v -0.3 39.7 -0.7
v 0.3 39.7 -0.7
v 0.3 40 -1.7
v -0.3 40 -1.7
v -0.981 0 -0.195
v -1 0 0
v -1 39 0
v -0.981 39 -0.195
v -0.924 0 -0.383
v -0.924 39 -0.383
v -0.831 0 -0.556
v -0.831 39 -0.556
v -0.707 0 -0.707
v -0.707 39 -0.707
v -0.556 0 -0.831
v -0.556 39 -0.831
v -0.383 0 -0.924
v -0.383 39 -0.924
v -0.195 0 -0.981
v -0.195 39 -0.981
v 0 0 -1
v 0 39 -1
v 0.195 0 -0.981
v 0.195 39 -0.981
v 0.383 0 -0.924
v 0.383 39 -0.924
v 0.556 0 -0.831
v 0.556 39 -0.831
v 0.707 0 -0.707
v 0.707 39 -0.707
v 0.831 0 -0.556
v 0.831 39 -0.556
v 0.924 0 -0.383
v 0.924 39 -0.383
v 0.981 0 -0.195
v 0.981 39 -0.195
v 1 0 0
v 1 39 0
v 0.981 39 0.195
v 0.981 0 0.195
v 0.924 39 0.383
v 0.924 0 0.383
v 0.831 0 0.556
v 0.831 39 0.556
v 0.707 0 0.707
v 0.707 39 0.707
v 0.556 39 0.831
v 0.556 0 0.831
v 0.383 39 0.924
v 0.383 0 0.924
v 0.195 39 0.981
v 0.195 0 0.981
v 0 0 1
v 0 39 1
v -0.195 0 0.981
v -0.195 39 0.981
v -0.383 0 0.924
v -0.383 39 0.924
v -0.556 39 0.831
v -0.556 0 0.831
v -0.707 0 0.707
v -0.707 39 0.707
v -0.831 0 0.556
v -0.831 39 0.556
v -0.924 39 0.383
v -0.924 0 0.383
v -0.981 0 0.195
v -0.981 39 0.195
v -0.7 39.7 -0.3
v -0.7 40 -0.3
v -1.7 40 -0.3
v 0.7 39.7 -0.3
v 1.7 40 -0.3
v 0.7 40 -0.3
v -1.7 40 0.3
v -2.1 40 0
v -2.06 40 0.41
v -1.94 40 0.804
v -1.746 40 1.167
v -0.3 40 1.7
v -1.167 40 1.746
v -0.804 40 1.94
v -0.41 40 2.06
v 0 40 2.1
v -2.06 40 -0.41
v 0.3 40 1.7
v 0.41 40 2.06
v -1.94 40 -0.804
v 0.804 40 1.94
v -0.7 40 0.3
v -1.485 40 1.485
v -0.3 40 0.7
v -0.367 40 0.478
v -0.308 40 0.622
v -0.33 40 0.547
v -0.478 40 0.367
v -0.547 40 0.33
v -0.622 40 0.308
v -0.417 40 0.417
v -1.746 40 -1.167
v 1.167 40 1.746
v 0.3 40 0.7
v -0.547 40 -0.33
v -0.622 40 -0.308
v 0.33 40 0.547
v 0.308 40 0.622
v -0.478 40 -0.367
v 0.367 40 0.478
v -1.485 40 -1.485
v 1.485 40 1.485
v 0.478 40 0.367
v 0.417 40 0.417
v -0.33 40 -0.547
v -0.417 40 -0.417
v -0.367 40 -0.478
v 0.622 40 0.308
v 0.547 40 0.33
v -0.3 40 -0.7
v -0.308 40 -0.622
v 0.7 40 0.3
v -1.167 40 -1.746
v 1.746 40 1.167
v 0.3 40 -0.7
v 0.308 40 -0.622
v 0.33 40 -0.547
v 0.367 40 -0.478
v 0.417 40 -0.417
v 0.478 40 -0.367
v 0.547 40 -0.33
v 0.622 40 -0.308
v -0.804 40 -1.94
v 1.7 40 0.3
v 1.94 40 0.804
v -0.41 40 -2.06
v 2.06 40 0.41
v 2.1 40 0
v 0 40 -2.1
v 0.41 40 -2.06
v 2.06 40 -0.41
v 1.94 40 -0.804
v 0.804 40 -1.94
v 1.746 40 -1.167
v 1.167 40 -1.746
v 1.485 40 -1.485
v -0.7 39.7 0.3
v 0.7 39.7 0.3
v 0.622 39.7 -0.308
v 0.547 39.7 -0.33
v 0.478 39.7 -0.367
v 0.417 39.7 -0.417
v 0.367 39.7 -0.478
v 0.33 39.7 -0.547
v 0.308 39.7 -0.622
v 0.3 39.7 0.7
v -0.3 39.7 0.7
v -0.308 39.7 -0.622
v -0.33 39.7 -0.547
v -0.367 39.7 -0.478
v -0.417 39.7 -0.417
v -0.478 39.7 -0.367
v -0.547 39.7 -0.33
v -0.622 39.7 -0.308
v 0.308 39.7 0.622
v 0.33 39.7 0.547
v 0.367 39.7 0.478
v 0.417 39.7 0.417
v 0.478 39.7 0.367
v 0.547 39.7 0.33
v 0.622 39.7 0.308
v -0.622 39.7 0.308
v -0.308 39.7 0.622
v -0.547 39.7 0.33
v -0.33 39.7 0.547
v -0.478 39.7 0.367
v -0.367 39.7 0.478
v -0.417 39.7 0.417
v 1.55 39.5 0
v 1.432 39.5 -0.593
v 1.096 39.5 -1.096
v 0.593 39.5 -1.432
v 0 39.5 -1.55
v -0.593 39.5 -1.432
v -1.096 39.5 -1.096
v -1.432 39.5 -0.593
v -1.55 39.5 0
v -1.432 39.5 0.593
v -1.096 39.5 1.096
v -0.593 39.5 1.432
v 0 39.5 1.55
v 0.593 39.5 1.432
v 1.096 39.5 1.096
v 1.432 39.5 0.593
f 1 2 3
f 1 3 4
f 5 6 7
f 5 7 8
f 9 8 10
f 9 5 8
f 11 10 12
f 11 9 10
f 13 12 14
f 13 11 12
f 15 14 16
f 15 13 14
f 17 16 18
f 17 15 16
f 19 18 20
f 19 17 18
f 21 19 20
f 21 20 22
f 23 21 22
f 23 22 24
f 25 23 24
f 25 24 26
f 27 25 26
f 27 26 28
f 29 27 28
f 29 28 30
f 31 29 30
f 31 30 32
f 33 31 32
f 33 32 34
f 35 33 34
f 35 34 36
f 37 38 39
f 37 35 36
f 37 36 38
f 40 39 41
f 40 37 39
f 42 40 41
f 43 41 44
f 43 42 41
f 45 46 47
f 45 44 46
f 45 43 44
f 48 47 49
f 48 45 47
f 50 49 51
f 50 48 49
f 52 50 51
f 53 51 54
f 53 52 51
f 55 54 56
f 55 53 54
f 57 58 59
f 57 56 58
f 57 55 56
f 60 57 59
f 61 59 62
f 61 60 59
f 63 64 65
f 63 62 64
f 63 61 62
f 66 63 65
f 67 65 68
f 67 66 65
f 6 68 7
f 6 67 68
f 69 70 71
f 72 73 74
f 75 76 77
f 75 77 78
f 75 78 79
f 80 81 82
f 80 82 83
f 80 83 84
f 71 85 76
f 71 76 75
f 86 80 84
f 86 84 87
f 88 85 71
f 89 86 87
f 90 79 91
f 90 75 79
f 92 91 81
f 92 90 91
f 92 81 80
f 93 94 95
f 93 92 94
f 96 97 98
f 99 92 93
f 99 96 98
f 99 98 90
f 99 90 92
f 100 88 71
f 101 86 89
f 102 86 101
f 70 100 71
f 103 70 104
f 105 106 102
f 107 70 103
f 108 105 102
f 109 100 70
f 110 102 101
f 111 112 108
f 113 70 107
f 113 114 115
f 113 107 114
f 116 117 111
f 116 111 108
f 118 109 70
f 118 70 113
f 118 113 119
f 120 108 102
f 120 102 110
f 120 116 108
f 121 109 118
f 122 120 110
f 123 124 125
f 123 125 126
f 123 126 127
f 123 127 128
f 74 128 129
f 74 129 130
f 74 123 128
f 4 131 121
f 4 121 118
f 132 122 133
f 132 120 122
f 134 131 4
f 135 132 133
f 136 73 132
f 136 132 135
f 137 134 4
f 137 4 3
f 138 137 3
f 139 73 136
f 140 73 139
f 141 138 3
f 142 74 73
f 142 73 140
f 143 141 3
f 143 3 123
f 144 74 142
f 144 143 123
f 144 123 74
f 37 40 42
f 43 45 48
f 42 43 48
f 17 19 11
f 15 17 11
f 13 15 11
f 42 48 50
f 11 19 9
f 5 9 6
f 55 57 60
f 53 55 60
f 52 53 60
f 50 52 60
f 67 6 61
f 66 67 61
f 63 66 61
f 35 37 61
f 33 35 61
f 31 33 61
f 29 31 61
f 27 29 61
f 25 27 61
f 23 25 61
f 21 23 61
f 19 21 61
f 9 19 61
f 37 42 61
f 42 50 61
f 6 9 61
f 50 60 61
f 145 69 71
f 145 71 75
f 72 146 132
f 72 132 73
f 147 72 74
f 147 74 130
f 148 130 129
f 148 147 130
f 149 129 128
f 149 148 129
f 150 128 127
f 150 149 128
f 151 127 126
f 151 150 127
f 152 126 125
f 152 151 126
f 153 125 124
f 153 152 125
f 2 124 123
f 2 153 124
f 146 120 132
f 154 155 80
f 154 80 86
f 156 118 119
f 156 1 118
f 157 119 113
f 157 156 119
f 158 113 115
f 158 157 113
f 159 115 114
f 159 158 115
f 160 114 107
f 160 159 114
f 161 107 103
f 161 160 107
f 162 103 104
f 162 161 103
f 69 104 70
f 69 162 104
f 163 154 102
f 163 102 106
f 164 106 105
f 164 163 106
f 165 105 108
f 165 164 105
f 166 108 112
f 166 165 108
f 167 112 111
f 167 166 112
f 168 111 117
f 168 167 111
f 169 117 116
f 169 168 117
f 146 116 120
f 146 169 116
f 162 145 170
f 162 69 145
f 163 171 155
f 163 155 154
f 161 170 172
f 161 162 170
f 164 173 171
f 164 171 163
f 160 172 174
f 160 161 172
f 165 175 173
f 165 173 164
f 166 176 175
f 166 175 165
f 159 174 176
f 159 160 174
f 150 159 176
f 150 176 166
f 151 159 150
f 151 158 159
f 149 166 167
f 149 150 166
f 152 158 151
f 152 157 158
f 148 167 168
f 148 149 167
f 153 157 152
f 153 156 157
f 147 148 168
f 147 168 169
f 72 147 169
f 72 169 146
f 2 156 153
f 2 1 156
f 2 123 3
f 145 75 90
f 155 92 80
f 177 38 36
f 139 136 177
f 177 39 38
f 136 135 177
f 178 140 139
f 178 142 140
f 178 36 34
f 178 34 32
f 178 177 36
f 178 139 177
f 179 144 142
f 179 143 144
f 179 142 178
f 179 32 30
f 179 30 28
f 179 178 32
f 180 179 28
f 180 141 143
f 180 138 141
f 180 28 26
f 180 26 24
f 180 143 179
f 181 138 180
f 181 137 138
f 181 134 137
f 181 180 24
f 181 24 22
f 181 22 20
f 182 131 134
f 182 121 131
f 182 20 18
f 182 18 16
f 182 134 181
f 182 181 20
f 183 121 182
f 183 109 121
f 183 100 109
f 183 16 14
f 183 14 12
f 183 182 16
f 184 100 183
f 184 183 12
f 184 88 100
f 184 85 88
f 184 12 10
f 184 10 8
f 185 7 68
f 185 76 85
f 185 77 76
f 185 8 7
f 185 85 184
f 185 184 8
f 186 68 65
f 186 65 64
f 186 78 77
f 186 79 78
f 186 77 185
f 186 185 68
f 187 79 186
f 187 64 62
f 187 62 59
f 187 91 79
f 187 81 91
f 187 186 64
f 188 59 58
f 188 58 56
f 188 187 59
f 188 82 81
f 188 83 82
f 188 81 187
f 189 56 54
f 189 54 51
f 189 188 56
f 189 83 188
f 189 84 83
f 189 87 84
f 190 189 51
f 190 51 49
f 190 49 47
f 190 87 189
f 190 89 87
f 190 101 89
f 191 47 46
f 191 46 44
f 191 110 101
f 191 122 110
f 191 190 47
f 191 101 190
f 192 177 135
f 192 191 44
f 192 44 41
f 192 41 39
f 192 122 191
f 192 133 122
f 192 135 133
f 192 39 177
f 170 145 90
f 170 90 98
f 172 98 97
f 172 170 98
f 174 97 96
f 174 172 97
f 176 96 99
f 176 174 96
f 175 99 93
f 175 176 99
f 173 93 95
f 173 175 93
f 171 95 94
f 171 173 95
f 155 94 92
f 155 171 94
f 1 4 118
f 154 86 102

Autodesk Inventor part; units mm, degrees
ref_plane "YZ Plane" through (0, 0, 0) normal (1, 0, 0) x (0, 1, 0)
ref_plane "XZ Plane" through (0, 0, 0) normal (0, 1, 0) x (-1, 0, 0)
sketch "Sketch1" plane through (0, 0, 0) normal (0, 1, 0) x (-1, 0, 0)
  circle A0 centre (0, 0) radius 1
  dimension "d0" = 2
extrude "Extrusion1" add sketch "Sketch1" along normal blind 40
sketch "Sketch2" plane through (0, 40, 0) normal (0, 1, 0) x (1, 0, 0)
  circle A0 centre (0, 0) radius 2.1
  dimension "d3" = 4.2
ref_plane "Work Plane1" through (0, 39, 0) normal (0, 1, 0) x (1, 0, 0)
sketch "Sketch3" plane through (0, 39, 0) normal (0, 1, 0) x (1, 0, 0)
  circle A0 centre (0, 0) radius 1 projected
loft "Loft1" add profiles "Sketch3", "Sketch2"
sketch "Sketch4" plane through (0, 40, 0) normal (0, 1, 0) x (1, 0, 0)
  line L0 (-1.7, -0.3) -> (1.7, -0.3)
  line L1 (1.7, -0.3) -> (1.7, 0.3)
  line L2 (1.7, 0.3) -> (-1.7, 0.3)
  line L3 (-1.7, 0.3) -> (-1.7, -0.3)
  line L4 (-0.3, -1.7) -> (0.3, -1.7)
  line L5 (0.3, -1.7) -> (0.3, 1.7)
  line L6 (0.3, 1.7) -> (-0.3, 1.7)
  line L7 (-0.3, 1.7) -> (-0.3, -1.7)
  point P0 (0, 0)
  point P1 (-1.7, 0)
  point P2 (0, -1.7)
  point P3 (0, -0.3)
  point P4 (0.3, 0)
  point P5 (-0.3, -0.3)
  point P6 (0.3, -0.3)
  point P7 (0.3, 0.3)
  point P8 (-0.3, 0.3)
  dimension "d9" = 3.4
  dimension "d10" = 3.4
  dimension "d11" = 0.6
  dimension "d12" = 0.6
extrude "Extrusion2" cut sketch "Sketch4" against normal blind 0.3
chamfer "Chamfer1" distance 0.3 distance2 1 1 edges at (1.7, 39.7, 0) measured on face at (1.7, 39.9, 0.1)
chamfer "Chamfer2" distance 0.3 distance2 1 1 edges at (0, 39.7, 1.7) measured on face at (-0.1, 39.9, 1.7)
chamfer "Chamfer3" distance 0.3 distance2 1 1 edges at (-1.7, 39.7, 0) measured on face at (-1.7, 39.9, -0.1)
chamfer "Chamfer4" distance 0.3 distance2 1 1 edges at (0, 39.7, -1.7) measured on face at (0.1, 39.9, -1.7)
fillet "Fillet1" radius 0.4 4 edges at (0.3, 39.85, 0.3) (-0.3, 39.85, 0.3) (0.3, 39.85, -0.3) (-0.3, 39.85, -0.3)
thread "Thread1" size "M2x0.4" class "6g" standard "ANSI Metric M Profile" full length
equation "\"d12\" = d11"
properties part number "m2_40mm" material "Stainless Steel"
